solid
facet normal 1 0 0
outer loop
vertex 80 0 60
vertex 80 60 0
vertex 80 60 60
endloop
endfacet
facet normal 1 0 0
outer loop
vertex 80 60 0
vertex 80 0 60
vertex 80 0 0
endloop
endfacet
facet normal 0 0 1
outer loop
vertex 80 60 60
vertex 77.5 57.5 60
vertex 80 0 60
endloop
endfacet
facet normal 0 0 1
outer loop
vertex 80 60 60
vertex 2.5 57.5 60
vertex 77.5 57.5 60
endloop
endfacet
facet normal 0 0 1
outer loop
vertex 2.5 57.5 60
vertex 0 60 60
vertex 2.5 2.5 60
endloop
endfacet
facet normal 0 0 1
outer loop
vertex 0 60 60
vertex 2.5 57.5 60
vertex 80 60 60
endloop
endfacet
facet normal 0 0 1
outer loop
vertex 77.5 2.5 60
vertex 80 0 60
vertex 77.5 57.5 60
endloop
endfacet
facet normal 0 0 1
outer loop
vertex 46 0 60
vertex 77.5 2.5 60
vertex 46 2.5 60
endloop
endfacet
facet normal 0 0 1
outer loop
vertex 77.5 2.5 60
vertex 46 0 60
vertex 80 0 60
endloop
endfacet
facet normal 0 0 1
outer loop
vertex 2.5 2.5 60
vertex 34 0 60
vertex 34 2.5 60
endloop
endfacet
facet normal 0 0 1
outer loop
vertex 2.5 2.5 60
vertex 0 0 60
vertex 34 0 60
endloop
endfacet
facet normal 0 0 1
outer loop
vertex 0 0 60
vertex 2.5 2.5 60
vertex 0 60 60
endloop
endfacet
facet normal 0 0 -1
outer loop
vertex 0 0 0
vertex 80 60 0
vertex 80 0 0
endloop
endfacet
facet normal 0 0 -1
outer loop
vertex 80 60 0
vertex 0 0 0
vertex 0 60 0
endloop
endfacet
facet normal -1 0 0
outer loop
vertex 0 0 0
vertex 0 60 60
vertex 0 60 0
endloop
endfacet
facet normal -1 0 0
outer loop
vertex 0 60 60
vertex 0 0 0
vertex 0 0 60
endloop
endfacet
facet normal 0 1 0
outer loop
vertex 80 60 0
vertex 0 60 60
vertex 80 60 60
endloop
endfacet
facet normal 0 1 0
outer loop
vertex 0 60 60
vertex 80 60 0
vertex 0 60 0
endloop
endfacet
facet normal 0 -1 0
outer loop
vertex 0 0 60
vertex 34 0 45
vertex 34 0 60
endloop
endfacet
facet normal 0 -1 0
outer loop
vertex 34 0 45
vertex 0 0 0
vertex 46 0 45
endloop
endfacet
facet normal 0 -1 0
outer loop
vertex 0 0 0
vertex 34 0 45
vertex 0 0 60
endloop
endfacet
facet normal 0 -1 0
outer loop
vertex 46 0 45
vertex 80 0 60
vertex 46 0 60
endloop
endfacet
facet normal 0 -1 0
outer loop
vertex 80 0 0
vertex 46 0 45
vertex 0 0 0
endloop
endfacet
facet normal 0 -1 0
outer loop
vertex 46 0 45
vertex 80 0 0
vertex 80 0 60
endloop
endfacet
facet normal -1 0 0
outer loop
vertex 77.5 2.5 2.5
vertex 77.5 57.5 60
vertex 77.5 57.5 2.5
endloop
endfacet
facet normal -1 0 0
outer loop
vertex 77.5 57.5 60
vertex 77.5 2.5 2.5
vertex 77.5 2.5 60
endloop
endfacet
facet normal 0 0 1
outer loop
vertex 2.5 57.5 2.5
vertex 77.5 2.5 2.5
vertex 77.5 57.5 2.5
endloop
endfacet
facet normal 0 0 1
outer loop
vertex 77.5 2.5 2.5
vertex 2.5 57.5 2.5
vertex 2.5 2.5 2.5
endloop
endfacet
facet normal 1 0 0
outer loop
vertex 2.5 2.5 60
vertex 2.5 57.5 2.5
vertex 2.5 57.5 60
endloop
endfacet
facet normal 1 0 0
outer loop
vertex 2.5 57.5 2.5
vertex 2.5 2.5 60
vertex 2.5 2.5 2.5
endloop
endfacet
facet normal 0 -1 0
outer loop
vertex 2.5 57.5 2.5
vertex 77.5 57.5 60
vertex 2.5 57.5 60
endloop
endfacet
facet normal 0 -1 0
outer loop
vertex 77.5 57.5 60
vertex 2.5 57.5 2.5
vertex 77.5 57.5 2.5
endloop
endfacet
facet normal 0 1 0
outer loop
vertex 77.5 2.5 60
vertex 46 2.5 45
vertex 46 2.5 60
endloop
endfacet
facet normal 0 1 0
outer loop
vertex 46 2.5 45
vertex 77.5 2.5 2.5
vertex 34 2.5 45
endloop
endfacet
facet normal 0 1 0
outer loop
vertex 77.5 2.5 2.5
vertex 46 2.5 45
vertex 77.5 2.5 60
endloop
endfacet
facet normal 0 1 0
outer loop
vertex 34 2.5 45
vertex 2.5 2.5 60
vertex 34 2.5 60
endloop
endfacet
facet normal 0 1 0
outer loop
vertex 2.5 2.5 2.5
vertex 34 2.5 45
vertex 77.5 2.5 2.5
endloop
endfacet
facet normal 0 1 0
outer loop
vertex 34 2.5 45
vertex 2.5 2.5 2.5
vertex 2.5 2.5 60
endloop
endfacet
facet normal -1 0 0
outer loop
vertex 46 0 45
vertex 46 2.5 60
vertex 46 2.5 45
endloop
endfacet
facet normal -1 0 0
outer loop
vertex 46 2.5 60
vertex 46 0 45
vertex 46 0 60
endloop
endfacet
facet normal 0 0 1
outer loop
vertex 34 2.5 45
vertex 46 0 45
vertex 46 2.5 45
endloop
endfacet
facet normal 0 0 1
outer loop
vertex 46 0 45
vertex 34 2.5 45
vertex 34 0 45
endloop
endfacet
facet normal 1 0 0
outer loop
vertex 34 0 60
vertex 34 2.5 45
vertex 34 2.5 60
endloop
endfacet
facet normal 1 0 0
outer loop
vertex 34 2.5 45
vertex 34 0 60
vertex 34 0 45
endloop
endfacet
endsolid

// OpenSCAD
$fn = 32;

// ----------------------------------------------------------------------
// Enclosure box: notch enclosure
// ----------------------------------------------------------------------

// --- parameters (mm) ---
box_l = 80;               // outer length, X
box_w = 60;               // outer width, Y
box_h = 60;               // outer height
wall_t = 2.5;             // wall thickness
notch_w = 12;             // cable notch width
notch_h = 15;             // cable notch height

inner_h = box_h - wall_t;  // cavity depth
boss_h = inner_h - 2;  // corner boss height

difference() {
  cube([box_l, box_w, box_h]);
  translate([wall_t, wall_t, wall_t])
    cube([box_l - 2 * wall_t, box_w - 2 * wall_t, box_h]);
  translate([box_l / 2 - notch_w / 2, -1, box_h - notch_h])
    cube([notch_w, wall_t + 2, notch_h + 1]);
}
